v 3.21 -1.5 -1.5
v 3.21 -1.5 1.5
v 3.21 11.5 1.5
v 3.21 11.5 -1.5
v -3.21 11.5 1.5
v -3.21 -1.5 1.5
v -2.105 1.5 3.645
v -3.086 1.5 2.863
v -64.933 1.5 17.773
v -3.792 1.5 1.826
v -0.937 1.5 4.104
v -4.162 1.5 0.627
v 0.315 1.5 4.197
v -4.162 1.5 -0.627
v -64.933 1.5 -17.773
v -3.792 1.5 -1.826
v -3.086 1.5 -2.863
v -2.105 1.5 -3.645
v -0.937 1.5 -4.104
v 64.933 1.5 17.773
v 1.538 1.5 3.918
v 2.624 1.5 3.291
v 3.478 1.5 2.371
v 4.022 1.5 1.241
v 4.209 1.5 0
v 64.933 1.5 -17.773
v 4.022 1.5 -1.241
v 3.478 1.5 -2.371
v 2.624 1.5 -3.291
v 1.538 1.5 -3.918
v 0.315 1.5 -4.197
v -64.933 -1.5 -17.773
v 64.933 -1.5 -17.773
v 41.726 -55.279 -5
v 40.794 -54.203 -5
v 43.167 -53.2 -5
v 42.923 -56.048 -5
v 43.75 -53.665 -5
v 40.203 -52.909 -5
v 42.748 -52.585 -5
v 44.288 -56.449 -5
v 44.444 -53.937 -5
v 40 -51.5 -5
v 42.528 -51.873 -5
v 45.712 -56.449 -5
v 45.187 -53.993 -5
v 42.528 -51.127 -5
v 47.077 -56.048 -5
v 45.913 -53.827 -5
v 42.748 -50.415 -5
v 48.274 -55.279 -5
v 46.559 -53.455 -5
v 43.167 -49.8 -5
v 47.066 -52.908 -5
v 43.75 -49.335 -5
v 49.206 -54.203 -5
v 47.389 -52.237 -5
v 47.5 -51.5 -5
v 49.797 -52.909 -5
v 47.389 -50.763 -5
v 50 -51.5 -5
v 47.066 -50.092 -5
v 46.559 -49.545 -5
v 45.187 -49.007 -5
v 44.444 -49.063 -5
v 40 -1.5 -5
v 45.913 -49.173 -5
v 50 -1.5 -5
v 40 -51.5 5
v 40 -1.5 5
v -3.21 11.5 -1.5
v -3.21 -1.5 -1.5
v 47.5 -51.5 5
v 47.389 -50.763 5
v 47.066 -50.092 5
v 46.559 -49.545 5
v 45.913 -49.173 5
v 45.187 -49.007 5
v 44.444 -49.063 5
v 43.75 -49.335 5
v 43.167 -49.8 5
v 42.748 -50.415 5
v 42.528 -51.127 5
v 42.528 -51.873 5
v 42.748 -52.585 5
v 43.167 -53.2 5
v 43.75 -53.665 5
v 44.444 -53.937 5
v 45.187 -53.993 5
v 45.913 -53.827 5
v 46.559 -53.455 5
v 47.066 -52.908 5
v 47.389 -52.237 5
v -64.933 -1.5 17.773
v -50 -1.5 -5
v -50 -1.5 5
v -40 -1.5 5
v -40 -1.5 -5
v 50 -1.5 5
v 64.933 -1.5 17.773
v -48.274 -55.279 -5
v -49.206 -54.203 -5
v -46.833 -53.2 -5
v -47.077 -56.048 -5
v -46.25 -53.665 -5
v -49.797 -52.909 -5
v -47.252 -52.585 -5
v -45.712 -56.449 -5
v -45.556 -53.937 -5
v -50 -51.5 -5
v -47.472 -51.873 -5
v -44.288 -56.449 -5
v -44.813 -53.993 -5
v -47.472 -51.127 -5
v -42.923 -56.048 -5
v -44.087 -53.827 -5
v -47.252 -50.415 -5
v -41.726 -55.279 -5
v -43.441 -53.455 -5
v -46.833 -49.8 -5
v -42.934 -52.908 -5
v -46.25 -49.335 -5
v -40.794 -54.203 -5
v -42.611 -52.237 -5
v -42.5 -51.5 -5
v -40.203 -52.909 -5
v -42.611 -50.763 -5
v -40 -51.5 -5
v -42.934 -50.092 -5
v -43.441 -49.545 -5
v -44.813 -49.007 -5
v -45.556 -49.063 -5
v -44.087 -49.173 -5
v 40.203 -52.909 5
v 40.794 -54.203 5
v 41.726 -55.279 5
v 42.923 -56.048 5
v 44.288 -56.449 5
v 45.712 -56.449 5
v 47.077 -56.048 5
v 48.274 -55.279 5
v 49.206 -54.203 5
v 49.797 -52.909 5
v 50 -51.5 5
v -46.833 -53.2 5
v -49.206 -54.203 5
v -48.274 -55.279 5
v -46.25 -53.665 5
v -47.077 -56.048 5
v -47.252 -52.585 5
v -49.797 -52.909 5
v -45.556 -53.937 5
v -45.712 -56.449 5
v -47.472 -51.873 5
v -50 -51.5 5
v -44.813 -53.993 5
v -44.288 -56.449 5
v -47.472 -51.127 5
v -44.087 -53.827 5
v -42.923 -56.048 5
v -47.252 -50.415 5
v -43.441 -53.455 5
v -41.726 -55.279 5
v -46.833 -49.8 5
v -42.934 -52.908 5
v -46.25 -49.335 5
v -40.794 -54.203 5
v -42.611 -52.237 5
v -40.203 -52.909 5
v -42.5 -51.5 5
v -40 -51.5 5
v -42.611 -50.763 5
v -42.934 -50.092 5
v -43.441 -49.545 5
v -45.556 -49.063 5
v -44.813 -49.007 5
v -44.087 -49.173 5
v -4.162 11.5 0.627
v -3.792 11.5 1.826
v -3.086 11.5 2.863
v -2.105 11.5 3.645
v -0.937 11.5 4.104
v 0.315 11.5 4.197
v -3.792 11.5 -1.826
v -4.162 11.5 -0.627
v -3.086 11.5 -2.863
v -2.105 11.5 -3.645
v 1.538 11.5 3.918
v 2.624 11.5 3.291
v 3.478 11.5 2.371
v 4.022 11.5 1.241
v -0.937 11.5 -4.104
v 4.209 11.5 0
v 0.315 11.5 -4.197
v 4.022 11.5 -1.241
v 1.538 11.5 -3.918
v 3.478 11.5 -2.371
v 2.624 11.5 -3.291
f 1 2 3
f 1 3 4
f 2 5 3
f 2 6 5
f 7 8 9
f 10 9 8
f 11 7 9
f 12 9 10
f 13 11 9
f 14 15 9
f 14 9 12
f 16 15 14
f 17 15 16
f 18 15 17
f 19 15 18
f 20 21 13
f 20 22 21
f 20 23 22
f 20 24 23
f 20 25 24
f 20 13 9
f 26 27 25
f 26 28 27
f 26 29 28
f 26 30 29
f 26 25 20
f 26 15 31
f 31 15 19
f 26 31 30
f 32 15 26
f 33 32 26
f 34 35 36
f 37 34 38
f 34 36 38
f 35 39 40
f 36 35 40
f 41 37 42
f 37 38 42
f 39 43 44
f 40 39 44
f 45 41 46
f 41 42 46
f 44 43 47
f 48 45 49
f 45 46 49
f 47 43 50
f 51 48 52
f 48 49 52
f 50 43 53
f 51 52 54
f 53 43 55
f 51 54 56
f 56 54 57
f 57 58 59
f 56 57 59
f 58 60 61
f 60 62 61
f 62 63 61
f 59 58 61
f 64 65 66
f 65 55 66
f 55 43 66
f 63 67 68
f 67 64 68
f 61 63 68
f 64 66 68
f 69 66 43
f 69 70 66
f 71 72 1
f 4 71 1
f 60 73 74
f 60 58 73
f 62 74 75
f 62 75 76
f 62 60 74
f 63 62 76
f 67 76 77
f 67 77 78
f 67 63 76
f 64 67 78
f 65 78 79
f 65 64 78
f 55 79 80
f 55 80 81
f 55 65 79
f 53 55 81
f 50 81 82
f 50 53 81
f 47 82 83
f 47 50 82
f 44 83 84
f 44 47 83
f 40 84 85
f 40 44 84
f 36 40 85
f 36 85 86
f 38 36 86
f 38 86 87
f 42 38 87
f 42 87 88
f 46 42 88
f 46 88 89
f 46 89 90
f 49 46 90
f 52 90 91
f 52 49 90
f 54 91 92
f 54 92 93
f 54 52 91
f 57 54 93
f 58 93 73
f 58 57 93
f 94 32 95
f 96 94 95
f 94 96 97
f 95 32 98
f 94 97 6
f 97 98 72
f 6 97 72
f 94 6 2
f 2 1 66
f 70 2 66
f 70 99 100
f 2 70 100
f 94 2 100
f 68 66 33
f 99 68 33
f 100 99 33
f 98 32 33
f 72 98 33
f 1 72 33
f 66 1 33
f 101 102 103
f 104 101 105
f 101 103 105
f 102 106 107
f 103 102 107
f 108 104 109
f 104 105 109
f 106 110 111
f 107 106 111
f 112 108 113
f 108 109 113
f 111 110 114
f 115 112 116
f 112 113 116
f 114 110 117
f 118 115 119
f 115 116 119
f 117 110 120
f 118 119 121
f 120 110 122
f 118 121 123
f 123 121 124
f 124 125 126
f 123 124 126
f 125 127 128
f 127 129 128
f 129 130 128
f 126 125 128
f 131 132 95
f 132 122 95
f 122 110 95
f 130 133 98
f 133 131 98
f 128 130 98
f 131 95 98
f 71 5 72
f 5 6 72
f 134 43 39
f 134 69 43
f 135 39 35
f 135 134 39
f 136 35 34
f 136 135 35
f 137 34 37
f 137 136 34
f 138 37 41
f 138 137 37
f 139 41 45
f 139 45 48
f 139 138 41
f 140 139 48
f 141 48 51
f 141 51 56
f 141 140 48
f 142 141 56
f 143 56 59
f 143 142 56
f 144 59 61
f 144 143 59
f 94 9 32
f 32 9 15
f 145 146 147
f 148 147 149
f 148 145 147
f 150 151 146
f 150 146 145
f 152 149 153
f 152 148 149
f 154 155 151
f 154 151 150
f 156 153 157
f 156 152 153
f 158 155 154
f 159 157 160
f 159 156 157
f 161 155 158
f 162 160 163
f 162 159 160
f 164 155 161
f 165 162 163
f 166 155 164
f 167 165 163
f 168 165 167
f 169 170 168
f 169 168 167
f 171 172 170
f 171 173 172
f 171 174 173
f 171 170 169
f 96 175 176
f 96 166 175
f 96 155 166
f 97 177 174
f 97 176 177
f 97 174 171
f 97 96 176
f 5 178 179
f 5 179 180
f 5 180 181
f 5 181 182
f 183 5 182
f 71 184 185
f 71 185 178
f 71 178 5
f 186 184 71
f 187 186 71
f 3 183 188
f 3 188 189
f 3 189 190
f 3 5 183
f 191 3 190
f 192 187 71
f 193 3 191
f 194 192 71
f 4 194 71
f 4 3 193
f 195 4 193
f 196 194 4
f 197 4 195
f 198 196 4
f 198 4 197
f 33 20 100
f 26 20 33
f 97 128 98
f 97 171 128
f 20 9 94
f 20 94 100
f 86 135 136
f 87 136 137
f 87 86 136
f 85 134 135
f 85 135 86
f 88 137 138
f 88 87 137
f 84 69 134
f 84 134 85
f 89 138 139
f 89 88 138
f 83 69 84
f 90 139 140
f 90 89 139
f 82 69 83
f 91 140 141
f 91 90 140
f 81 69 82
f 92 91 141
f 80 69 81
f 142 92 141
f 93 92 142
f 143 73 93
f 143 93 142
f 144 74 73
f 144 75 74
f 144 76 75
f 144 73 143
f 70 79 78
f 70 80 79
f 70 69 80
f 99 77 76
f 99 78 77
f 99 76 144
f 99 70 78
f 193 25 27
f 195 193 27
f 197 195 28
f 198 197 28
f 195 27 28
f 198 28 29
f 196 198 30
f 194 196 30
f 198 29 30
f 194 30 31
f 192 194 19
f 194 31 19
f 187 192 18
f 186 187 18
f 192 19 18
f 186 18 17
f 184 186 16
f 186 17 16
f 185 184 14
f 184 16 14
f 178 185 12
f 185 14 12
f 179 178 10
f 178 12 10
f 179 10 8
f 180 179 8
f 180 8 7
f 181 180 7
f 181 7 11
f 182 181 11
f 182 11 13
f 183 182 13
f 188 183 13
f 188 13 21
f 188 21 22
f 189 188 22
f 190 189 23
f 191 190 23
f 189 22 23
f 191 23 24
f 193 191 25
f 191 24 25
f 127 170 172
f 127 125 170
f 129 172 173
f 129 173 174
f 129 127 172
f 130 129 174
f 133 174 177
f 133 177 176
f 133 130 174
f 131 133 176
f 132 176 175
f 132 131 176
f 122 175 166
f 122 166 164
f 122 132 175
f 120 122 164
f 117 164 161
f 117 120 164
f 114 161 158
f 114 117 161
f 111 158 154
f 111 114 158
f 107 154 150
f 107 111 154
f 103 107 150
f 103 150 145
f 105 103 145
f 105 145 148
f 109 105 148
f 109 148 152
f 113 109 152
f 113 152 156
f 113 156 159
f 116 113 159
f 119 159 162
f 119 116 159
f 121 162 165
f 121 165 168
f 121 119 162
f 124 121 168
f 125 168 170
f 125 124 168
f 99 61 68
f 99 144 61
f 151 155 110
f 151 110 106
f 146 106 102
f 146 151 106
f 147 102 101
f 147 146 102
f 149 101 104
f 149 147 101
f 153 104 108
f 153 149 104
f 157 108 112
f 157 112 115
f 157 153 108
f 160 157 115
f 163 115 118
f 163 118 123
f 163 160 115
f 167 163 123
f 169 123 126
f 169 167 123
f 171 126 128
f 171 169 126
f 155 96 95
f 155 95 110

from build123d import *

# Parameters (mm, degrees)
SKETCH1_R           = 2.5
BOSS_EXTRUDE1_DEPTH = 5
SKETCH2_W           = 129.866808808
SKETCH2_H           = 35.545574104
BOSS_EXTRUDE2_DEPTH = 3
SKETCH3_W           = 6.42
SKETCH3_H           = 3
CUT_EXTRUDE1_DEPTH  = 89.860671656
SKETCH4_R           = 4.209133058
SKETCH4_W           = 6.42
SKETCH4_H           = 3
BOSS_EXTRUDE3_DEPTH = 10


with BuildPart() as part:
    # Sketch1 → Boss-Extrude1 (new, symmetric)
    with BuildSketch(Plane.XY):
        with BuildLine():
            Line((50, -1.5), (55, -1.5))
            Line((55, -1.5), (55, 1.5))
            Line((55, 1.5), (-55, 1.5))
            Line((-55, 1.5), (-55, -1.5))
            Line((-55, -1.5), (-50, -1.5))
            Line((-50, -1.5), (-50, -51.5))
            ThreePointArc((-50, -51.5), (-45, -56.5), (-40, -51.5))
            Line((-40, -51.5), (-40, -1.5))
            Line((-40, -1.5), (40, -1.5))
            Line((40, -1.5), (40, -51.5))
            ThreePointArc((40, -51.5), (45, -56.5), (50, -51.5))
            Line((50, -51.5), (50, -1.5))
        make_face()
        with Locations((-45, -51.5)):
            Circle(SKETCH1_R, mode=Mode.SUBTRACT)
        with Locations((45, -51.5)):
            Circle(SKETCH1_R, mode=Mode.SUBTRACT)
    extrude(amount=BOSS_EXTRUDE1_DEPTH, both=True)

    # Sketch2 → Boss-Extrude2 (add)
    with BuildSketch(Plane(origin=(0, 1.5, 0), x_dir=(1, 0, 0), z_dir=(0, 1, 0))):
        Rectangle(SKETCH2_W, SKETCH2_H)
    extrude(amount=-BOSS_EXTRUDE2_DEPTH)

    # Sketch3 → Cut-Extrude1 (cut, through all)
    with BuildSketch(Plane(origin=(0, 1.5, 0), x_dir=(1, 0, 0), z_dir=(0, 1, 0))):
        Rectangle(SKETCH3_W, SKETCH3_H)
    extrude(amount=-CUT_EXTRUDE1_DEPTH, mode=Mode.SUBTRACT)

    # Sketch4 → Boss-Extrude3 (add)
    with BuildSketch(Plane(origin=(0, 1.5, 0), x_dir=(1, 0, 0), z_dir=(0, 1, 0))):
        Circle(SKETCH4_R)
        Rectangle(SKETCH4_W, SKETCH4_H, mode=Mode.SUBTRACT)
    extrude(amount=BOSS_EXTRUDE3_DEPTH)


solid = part.part
